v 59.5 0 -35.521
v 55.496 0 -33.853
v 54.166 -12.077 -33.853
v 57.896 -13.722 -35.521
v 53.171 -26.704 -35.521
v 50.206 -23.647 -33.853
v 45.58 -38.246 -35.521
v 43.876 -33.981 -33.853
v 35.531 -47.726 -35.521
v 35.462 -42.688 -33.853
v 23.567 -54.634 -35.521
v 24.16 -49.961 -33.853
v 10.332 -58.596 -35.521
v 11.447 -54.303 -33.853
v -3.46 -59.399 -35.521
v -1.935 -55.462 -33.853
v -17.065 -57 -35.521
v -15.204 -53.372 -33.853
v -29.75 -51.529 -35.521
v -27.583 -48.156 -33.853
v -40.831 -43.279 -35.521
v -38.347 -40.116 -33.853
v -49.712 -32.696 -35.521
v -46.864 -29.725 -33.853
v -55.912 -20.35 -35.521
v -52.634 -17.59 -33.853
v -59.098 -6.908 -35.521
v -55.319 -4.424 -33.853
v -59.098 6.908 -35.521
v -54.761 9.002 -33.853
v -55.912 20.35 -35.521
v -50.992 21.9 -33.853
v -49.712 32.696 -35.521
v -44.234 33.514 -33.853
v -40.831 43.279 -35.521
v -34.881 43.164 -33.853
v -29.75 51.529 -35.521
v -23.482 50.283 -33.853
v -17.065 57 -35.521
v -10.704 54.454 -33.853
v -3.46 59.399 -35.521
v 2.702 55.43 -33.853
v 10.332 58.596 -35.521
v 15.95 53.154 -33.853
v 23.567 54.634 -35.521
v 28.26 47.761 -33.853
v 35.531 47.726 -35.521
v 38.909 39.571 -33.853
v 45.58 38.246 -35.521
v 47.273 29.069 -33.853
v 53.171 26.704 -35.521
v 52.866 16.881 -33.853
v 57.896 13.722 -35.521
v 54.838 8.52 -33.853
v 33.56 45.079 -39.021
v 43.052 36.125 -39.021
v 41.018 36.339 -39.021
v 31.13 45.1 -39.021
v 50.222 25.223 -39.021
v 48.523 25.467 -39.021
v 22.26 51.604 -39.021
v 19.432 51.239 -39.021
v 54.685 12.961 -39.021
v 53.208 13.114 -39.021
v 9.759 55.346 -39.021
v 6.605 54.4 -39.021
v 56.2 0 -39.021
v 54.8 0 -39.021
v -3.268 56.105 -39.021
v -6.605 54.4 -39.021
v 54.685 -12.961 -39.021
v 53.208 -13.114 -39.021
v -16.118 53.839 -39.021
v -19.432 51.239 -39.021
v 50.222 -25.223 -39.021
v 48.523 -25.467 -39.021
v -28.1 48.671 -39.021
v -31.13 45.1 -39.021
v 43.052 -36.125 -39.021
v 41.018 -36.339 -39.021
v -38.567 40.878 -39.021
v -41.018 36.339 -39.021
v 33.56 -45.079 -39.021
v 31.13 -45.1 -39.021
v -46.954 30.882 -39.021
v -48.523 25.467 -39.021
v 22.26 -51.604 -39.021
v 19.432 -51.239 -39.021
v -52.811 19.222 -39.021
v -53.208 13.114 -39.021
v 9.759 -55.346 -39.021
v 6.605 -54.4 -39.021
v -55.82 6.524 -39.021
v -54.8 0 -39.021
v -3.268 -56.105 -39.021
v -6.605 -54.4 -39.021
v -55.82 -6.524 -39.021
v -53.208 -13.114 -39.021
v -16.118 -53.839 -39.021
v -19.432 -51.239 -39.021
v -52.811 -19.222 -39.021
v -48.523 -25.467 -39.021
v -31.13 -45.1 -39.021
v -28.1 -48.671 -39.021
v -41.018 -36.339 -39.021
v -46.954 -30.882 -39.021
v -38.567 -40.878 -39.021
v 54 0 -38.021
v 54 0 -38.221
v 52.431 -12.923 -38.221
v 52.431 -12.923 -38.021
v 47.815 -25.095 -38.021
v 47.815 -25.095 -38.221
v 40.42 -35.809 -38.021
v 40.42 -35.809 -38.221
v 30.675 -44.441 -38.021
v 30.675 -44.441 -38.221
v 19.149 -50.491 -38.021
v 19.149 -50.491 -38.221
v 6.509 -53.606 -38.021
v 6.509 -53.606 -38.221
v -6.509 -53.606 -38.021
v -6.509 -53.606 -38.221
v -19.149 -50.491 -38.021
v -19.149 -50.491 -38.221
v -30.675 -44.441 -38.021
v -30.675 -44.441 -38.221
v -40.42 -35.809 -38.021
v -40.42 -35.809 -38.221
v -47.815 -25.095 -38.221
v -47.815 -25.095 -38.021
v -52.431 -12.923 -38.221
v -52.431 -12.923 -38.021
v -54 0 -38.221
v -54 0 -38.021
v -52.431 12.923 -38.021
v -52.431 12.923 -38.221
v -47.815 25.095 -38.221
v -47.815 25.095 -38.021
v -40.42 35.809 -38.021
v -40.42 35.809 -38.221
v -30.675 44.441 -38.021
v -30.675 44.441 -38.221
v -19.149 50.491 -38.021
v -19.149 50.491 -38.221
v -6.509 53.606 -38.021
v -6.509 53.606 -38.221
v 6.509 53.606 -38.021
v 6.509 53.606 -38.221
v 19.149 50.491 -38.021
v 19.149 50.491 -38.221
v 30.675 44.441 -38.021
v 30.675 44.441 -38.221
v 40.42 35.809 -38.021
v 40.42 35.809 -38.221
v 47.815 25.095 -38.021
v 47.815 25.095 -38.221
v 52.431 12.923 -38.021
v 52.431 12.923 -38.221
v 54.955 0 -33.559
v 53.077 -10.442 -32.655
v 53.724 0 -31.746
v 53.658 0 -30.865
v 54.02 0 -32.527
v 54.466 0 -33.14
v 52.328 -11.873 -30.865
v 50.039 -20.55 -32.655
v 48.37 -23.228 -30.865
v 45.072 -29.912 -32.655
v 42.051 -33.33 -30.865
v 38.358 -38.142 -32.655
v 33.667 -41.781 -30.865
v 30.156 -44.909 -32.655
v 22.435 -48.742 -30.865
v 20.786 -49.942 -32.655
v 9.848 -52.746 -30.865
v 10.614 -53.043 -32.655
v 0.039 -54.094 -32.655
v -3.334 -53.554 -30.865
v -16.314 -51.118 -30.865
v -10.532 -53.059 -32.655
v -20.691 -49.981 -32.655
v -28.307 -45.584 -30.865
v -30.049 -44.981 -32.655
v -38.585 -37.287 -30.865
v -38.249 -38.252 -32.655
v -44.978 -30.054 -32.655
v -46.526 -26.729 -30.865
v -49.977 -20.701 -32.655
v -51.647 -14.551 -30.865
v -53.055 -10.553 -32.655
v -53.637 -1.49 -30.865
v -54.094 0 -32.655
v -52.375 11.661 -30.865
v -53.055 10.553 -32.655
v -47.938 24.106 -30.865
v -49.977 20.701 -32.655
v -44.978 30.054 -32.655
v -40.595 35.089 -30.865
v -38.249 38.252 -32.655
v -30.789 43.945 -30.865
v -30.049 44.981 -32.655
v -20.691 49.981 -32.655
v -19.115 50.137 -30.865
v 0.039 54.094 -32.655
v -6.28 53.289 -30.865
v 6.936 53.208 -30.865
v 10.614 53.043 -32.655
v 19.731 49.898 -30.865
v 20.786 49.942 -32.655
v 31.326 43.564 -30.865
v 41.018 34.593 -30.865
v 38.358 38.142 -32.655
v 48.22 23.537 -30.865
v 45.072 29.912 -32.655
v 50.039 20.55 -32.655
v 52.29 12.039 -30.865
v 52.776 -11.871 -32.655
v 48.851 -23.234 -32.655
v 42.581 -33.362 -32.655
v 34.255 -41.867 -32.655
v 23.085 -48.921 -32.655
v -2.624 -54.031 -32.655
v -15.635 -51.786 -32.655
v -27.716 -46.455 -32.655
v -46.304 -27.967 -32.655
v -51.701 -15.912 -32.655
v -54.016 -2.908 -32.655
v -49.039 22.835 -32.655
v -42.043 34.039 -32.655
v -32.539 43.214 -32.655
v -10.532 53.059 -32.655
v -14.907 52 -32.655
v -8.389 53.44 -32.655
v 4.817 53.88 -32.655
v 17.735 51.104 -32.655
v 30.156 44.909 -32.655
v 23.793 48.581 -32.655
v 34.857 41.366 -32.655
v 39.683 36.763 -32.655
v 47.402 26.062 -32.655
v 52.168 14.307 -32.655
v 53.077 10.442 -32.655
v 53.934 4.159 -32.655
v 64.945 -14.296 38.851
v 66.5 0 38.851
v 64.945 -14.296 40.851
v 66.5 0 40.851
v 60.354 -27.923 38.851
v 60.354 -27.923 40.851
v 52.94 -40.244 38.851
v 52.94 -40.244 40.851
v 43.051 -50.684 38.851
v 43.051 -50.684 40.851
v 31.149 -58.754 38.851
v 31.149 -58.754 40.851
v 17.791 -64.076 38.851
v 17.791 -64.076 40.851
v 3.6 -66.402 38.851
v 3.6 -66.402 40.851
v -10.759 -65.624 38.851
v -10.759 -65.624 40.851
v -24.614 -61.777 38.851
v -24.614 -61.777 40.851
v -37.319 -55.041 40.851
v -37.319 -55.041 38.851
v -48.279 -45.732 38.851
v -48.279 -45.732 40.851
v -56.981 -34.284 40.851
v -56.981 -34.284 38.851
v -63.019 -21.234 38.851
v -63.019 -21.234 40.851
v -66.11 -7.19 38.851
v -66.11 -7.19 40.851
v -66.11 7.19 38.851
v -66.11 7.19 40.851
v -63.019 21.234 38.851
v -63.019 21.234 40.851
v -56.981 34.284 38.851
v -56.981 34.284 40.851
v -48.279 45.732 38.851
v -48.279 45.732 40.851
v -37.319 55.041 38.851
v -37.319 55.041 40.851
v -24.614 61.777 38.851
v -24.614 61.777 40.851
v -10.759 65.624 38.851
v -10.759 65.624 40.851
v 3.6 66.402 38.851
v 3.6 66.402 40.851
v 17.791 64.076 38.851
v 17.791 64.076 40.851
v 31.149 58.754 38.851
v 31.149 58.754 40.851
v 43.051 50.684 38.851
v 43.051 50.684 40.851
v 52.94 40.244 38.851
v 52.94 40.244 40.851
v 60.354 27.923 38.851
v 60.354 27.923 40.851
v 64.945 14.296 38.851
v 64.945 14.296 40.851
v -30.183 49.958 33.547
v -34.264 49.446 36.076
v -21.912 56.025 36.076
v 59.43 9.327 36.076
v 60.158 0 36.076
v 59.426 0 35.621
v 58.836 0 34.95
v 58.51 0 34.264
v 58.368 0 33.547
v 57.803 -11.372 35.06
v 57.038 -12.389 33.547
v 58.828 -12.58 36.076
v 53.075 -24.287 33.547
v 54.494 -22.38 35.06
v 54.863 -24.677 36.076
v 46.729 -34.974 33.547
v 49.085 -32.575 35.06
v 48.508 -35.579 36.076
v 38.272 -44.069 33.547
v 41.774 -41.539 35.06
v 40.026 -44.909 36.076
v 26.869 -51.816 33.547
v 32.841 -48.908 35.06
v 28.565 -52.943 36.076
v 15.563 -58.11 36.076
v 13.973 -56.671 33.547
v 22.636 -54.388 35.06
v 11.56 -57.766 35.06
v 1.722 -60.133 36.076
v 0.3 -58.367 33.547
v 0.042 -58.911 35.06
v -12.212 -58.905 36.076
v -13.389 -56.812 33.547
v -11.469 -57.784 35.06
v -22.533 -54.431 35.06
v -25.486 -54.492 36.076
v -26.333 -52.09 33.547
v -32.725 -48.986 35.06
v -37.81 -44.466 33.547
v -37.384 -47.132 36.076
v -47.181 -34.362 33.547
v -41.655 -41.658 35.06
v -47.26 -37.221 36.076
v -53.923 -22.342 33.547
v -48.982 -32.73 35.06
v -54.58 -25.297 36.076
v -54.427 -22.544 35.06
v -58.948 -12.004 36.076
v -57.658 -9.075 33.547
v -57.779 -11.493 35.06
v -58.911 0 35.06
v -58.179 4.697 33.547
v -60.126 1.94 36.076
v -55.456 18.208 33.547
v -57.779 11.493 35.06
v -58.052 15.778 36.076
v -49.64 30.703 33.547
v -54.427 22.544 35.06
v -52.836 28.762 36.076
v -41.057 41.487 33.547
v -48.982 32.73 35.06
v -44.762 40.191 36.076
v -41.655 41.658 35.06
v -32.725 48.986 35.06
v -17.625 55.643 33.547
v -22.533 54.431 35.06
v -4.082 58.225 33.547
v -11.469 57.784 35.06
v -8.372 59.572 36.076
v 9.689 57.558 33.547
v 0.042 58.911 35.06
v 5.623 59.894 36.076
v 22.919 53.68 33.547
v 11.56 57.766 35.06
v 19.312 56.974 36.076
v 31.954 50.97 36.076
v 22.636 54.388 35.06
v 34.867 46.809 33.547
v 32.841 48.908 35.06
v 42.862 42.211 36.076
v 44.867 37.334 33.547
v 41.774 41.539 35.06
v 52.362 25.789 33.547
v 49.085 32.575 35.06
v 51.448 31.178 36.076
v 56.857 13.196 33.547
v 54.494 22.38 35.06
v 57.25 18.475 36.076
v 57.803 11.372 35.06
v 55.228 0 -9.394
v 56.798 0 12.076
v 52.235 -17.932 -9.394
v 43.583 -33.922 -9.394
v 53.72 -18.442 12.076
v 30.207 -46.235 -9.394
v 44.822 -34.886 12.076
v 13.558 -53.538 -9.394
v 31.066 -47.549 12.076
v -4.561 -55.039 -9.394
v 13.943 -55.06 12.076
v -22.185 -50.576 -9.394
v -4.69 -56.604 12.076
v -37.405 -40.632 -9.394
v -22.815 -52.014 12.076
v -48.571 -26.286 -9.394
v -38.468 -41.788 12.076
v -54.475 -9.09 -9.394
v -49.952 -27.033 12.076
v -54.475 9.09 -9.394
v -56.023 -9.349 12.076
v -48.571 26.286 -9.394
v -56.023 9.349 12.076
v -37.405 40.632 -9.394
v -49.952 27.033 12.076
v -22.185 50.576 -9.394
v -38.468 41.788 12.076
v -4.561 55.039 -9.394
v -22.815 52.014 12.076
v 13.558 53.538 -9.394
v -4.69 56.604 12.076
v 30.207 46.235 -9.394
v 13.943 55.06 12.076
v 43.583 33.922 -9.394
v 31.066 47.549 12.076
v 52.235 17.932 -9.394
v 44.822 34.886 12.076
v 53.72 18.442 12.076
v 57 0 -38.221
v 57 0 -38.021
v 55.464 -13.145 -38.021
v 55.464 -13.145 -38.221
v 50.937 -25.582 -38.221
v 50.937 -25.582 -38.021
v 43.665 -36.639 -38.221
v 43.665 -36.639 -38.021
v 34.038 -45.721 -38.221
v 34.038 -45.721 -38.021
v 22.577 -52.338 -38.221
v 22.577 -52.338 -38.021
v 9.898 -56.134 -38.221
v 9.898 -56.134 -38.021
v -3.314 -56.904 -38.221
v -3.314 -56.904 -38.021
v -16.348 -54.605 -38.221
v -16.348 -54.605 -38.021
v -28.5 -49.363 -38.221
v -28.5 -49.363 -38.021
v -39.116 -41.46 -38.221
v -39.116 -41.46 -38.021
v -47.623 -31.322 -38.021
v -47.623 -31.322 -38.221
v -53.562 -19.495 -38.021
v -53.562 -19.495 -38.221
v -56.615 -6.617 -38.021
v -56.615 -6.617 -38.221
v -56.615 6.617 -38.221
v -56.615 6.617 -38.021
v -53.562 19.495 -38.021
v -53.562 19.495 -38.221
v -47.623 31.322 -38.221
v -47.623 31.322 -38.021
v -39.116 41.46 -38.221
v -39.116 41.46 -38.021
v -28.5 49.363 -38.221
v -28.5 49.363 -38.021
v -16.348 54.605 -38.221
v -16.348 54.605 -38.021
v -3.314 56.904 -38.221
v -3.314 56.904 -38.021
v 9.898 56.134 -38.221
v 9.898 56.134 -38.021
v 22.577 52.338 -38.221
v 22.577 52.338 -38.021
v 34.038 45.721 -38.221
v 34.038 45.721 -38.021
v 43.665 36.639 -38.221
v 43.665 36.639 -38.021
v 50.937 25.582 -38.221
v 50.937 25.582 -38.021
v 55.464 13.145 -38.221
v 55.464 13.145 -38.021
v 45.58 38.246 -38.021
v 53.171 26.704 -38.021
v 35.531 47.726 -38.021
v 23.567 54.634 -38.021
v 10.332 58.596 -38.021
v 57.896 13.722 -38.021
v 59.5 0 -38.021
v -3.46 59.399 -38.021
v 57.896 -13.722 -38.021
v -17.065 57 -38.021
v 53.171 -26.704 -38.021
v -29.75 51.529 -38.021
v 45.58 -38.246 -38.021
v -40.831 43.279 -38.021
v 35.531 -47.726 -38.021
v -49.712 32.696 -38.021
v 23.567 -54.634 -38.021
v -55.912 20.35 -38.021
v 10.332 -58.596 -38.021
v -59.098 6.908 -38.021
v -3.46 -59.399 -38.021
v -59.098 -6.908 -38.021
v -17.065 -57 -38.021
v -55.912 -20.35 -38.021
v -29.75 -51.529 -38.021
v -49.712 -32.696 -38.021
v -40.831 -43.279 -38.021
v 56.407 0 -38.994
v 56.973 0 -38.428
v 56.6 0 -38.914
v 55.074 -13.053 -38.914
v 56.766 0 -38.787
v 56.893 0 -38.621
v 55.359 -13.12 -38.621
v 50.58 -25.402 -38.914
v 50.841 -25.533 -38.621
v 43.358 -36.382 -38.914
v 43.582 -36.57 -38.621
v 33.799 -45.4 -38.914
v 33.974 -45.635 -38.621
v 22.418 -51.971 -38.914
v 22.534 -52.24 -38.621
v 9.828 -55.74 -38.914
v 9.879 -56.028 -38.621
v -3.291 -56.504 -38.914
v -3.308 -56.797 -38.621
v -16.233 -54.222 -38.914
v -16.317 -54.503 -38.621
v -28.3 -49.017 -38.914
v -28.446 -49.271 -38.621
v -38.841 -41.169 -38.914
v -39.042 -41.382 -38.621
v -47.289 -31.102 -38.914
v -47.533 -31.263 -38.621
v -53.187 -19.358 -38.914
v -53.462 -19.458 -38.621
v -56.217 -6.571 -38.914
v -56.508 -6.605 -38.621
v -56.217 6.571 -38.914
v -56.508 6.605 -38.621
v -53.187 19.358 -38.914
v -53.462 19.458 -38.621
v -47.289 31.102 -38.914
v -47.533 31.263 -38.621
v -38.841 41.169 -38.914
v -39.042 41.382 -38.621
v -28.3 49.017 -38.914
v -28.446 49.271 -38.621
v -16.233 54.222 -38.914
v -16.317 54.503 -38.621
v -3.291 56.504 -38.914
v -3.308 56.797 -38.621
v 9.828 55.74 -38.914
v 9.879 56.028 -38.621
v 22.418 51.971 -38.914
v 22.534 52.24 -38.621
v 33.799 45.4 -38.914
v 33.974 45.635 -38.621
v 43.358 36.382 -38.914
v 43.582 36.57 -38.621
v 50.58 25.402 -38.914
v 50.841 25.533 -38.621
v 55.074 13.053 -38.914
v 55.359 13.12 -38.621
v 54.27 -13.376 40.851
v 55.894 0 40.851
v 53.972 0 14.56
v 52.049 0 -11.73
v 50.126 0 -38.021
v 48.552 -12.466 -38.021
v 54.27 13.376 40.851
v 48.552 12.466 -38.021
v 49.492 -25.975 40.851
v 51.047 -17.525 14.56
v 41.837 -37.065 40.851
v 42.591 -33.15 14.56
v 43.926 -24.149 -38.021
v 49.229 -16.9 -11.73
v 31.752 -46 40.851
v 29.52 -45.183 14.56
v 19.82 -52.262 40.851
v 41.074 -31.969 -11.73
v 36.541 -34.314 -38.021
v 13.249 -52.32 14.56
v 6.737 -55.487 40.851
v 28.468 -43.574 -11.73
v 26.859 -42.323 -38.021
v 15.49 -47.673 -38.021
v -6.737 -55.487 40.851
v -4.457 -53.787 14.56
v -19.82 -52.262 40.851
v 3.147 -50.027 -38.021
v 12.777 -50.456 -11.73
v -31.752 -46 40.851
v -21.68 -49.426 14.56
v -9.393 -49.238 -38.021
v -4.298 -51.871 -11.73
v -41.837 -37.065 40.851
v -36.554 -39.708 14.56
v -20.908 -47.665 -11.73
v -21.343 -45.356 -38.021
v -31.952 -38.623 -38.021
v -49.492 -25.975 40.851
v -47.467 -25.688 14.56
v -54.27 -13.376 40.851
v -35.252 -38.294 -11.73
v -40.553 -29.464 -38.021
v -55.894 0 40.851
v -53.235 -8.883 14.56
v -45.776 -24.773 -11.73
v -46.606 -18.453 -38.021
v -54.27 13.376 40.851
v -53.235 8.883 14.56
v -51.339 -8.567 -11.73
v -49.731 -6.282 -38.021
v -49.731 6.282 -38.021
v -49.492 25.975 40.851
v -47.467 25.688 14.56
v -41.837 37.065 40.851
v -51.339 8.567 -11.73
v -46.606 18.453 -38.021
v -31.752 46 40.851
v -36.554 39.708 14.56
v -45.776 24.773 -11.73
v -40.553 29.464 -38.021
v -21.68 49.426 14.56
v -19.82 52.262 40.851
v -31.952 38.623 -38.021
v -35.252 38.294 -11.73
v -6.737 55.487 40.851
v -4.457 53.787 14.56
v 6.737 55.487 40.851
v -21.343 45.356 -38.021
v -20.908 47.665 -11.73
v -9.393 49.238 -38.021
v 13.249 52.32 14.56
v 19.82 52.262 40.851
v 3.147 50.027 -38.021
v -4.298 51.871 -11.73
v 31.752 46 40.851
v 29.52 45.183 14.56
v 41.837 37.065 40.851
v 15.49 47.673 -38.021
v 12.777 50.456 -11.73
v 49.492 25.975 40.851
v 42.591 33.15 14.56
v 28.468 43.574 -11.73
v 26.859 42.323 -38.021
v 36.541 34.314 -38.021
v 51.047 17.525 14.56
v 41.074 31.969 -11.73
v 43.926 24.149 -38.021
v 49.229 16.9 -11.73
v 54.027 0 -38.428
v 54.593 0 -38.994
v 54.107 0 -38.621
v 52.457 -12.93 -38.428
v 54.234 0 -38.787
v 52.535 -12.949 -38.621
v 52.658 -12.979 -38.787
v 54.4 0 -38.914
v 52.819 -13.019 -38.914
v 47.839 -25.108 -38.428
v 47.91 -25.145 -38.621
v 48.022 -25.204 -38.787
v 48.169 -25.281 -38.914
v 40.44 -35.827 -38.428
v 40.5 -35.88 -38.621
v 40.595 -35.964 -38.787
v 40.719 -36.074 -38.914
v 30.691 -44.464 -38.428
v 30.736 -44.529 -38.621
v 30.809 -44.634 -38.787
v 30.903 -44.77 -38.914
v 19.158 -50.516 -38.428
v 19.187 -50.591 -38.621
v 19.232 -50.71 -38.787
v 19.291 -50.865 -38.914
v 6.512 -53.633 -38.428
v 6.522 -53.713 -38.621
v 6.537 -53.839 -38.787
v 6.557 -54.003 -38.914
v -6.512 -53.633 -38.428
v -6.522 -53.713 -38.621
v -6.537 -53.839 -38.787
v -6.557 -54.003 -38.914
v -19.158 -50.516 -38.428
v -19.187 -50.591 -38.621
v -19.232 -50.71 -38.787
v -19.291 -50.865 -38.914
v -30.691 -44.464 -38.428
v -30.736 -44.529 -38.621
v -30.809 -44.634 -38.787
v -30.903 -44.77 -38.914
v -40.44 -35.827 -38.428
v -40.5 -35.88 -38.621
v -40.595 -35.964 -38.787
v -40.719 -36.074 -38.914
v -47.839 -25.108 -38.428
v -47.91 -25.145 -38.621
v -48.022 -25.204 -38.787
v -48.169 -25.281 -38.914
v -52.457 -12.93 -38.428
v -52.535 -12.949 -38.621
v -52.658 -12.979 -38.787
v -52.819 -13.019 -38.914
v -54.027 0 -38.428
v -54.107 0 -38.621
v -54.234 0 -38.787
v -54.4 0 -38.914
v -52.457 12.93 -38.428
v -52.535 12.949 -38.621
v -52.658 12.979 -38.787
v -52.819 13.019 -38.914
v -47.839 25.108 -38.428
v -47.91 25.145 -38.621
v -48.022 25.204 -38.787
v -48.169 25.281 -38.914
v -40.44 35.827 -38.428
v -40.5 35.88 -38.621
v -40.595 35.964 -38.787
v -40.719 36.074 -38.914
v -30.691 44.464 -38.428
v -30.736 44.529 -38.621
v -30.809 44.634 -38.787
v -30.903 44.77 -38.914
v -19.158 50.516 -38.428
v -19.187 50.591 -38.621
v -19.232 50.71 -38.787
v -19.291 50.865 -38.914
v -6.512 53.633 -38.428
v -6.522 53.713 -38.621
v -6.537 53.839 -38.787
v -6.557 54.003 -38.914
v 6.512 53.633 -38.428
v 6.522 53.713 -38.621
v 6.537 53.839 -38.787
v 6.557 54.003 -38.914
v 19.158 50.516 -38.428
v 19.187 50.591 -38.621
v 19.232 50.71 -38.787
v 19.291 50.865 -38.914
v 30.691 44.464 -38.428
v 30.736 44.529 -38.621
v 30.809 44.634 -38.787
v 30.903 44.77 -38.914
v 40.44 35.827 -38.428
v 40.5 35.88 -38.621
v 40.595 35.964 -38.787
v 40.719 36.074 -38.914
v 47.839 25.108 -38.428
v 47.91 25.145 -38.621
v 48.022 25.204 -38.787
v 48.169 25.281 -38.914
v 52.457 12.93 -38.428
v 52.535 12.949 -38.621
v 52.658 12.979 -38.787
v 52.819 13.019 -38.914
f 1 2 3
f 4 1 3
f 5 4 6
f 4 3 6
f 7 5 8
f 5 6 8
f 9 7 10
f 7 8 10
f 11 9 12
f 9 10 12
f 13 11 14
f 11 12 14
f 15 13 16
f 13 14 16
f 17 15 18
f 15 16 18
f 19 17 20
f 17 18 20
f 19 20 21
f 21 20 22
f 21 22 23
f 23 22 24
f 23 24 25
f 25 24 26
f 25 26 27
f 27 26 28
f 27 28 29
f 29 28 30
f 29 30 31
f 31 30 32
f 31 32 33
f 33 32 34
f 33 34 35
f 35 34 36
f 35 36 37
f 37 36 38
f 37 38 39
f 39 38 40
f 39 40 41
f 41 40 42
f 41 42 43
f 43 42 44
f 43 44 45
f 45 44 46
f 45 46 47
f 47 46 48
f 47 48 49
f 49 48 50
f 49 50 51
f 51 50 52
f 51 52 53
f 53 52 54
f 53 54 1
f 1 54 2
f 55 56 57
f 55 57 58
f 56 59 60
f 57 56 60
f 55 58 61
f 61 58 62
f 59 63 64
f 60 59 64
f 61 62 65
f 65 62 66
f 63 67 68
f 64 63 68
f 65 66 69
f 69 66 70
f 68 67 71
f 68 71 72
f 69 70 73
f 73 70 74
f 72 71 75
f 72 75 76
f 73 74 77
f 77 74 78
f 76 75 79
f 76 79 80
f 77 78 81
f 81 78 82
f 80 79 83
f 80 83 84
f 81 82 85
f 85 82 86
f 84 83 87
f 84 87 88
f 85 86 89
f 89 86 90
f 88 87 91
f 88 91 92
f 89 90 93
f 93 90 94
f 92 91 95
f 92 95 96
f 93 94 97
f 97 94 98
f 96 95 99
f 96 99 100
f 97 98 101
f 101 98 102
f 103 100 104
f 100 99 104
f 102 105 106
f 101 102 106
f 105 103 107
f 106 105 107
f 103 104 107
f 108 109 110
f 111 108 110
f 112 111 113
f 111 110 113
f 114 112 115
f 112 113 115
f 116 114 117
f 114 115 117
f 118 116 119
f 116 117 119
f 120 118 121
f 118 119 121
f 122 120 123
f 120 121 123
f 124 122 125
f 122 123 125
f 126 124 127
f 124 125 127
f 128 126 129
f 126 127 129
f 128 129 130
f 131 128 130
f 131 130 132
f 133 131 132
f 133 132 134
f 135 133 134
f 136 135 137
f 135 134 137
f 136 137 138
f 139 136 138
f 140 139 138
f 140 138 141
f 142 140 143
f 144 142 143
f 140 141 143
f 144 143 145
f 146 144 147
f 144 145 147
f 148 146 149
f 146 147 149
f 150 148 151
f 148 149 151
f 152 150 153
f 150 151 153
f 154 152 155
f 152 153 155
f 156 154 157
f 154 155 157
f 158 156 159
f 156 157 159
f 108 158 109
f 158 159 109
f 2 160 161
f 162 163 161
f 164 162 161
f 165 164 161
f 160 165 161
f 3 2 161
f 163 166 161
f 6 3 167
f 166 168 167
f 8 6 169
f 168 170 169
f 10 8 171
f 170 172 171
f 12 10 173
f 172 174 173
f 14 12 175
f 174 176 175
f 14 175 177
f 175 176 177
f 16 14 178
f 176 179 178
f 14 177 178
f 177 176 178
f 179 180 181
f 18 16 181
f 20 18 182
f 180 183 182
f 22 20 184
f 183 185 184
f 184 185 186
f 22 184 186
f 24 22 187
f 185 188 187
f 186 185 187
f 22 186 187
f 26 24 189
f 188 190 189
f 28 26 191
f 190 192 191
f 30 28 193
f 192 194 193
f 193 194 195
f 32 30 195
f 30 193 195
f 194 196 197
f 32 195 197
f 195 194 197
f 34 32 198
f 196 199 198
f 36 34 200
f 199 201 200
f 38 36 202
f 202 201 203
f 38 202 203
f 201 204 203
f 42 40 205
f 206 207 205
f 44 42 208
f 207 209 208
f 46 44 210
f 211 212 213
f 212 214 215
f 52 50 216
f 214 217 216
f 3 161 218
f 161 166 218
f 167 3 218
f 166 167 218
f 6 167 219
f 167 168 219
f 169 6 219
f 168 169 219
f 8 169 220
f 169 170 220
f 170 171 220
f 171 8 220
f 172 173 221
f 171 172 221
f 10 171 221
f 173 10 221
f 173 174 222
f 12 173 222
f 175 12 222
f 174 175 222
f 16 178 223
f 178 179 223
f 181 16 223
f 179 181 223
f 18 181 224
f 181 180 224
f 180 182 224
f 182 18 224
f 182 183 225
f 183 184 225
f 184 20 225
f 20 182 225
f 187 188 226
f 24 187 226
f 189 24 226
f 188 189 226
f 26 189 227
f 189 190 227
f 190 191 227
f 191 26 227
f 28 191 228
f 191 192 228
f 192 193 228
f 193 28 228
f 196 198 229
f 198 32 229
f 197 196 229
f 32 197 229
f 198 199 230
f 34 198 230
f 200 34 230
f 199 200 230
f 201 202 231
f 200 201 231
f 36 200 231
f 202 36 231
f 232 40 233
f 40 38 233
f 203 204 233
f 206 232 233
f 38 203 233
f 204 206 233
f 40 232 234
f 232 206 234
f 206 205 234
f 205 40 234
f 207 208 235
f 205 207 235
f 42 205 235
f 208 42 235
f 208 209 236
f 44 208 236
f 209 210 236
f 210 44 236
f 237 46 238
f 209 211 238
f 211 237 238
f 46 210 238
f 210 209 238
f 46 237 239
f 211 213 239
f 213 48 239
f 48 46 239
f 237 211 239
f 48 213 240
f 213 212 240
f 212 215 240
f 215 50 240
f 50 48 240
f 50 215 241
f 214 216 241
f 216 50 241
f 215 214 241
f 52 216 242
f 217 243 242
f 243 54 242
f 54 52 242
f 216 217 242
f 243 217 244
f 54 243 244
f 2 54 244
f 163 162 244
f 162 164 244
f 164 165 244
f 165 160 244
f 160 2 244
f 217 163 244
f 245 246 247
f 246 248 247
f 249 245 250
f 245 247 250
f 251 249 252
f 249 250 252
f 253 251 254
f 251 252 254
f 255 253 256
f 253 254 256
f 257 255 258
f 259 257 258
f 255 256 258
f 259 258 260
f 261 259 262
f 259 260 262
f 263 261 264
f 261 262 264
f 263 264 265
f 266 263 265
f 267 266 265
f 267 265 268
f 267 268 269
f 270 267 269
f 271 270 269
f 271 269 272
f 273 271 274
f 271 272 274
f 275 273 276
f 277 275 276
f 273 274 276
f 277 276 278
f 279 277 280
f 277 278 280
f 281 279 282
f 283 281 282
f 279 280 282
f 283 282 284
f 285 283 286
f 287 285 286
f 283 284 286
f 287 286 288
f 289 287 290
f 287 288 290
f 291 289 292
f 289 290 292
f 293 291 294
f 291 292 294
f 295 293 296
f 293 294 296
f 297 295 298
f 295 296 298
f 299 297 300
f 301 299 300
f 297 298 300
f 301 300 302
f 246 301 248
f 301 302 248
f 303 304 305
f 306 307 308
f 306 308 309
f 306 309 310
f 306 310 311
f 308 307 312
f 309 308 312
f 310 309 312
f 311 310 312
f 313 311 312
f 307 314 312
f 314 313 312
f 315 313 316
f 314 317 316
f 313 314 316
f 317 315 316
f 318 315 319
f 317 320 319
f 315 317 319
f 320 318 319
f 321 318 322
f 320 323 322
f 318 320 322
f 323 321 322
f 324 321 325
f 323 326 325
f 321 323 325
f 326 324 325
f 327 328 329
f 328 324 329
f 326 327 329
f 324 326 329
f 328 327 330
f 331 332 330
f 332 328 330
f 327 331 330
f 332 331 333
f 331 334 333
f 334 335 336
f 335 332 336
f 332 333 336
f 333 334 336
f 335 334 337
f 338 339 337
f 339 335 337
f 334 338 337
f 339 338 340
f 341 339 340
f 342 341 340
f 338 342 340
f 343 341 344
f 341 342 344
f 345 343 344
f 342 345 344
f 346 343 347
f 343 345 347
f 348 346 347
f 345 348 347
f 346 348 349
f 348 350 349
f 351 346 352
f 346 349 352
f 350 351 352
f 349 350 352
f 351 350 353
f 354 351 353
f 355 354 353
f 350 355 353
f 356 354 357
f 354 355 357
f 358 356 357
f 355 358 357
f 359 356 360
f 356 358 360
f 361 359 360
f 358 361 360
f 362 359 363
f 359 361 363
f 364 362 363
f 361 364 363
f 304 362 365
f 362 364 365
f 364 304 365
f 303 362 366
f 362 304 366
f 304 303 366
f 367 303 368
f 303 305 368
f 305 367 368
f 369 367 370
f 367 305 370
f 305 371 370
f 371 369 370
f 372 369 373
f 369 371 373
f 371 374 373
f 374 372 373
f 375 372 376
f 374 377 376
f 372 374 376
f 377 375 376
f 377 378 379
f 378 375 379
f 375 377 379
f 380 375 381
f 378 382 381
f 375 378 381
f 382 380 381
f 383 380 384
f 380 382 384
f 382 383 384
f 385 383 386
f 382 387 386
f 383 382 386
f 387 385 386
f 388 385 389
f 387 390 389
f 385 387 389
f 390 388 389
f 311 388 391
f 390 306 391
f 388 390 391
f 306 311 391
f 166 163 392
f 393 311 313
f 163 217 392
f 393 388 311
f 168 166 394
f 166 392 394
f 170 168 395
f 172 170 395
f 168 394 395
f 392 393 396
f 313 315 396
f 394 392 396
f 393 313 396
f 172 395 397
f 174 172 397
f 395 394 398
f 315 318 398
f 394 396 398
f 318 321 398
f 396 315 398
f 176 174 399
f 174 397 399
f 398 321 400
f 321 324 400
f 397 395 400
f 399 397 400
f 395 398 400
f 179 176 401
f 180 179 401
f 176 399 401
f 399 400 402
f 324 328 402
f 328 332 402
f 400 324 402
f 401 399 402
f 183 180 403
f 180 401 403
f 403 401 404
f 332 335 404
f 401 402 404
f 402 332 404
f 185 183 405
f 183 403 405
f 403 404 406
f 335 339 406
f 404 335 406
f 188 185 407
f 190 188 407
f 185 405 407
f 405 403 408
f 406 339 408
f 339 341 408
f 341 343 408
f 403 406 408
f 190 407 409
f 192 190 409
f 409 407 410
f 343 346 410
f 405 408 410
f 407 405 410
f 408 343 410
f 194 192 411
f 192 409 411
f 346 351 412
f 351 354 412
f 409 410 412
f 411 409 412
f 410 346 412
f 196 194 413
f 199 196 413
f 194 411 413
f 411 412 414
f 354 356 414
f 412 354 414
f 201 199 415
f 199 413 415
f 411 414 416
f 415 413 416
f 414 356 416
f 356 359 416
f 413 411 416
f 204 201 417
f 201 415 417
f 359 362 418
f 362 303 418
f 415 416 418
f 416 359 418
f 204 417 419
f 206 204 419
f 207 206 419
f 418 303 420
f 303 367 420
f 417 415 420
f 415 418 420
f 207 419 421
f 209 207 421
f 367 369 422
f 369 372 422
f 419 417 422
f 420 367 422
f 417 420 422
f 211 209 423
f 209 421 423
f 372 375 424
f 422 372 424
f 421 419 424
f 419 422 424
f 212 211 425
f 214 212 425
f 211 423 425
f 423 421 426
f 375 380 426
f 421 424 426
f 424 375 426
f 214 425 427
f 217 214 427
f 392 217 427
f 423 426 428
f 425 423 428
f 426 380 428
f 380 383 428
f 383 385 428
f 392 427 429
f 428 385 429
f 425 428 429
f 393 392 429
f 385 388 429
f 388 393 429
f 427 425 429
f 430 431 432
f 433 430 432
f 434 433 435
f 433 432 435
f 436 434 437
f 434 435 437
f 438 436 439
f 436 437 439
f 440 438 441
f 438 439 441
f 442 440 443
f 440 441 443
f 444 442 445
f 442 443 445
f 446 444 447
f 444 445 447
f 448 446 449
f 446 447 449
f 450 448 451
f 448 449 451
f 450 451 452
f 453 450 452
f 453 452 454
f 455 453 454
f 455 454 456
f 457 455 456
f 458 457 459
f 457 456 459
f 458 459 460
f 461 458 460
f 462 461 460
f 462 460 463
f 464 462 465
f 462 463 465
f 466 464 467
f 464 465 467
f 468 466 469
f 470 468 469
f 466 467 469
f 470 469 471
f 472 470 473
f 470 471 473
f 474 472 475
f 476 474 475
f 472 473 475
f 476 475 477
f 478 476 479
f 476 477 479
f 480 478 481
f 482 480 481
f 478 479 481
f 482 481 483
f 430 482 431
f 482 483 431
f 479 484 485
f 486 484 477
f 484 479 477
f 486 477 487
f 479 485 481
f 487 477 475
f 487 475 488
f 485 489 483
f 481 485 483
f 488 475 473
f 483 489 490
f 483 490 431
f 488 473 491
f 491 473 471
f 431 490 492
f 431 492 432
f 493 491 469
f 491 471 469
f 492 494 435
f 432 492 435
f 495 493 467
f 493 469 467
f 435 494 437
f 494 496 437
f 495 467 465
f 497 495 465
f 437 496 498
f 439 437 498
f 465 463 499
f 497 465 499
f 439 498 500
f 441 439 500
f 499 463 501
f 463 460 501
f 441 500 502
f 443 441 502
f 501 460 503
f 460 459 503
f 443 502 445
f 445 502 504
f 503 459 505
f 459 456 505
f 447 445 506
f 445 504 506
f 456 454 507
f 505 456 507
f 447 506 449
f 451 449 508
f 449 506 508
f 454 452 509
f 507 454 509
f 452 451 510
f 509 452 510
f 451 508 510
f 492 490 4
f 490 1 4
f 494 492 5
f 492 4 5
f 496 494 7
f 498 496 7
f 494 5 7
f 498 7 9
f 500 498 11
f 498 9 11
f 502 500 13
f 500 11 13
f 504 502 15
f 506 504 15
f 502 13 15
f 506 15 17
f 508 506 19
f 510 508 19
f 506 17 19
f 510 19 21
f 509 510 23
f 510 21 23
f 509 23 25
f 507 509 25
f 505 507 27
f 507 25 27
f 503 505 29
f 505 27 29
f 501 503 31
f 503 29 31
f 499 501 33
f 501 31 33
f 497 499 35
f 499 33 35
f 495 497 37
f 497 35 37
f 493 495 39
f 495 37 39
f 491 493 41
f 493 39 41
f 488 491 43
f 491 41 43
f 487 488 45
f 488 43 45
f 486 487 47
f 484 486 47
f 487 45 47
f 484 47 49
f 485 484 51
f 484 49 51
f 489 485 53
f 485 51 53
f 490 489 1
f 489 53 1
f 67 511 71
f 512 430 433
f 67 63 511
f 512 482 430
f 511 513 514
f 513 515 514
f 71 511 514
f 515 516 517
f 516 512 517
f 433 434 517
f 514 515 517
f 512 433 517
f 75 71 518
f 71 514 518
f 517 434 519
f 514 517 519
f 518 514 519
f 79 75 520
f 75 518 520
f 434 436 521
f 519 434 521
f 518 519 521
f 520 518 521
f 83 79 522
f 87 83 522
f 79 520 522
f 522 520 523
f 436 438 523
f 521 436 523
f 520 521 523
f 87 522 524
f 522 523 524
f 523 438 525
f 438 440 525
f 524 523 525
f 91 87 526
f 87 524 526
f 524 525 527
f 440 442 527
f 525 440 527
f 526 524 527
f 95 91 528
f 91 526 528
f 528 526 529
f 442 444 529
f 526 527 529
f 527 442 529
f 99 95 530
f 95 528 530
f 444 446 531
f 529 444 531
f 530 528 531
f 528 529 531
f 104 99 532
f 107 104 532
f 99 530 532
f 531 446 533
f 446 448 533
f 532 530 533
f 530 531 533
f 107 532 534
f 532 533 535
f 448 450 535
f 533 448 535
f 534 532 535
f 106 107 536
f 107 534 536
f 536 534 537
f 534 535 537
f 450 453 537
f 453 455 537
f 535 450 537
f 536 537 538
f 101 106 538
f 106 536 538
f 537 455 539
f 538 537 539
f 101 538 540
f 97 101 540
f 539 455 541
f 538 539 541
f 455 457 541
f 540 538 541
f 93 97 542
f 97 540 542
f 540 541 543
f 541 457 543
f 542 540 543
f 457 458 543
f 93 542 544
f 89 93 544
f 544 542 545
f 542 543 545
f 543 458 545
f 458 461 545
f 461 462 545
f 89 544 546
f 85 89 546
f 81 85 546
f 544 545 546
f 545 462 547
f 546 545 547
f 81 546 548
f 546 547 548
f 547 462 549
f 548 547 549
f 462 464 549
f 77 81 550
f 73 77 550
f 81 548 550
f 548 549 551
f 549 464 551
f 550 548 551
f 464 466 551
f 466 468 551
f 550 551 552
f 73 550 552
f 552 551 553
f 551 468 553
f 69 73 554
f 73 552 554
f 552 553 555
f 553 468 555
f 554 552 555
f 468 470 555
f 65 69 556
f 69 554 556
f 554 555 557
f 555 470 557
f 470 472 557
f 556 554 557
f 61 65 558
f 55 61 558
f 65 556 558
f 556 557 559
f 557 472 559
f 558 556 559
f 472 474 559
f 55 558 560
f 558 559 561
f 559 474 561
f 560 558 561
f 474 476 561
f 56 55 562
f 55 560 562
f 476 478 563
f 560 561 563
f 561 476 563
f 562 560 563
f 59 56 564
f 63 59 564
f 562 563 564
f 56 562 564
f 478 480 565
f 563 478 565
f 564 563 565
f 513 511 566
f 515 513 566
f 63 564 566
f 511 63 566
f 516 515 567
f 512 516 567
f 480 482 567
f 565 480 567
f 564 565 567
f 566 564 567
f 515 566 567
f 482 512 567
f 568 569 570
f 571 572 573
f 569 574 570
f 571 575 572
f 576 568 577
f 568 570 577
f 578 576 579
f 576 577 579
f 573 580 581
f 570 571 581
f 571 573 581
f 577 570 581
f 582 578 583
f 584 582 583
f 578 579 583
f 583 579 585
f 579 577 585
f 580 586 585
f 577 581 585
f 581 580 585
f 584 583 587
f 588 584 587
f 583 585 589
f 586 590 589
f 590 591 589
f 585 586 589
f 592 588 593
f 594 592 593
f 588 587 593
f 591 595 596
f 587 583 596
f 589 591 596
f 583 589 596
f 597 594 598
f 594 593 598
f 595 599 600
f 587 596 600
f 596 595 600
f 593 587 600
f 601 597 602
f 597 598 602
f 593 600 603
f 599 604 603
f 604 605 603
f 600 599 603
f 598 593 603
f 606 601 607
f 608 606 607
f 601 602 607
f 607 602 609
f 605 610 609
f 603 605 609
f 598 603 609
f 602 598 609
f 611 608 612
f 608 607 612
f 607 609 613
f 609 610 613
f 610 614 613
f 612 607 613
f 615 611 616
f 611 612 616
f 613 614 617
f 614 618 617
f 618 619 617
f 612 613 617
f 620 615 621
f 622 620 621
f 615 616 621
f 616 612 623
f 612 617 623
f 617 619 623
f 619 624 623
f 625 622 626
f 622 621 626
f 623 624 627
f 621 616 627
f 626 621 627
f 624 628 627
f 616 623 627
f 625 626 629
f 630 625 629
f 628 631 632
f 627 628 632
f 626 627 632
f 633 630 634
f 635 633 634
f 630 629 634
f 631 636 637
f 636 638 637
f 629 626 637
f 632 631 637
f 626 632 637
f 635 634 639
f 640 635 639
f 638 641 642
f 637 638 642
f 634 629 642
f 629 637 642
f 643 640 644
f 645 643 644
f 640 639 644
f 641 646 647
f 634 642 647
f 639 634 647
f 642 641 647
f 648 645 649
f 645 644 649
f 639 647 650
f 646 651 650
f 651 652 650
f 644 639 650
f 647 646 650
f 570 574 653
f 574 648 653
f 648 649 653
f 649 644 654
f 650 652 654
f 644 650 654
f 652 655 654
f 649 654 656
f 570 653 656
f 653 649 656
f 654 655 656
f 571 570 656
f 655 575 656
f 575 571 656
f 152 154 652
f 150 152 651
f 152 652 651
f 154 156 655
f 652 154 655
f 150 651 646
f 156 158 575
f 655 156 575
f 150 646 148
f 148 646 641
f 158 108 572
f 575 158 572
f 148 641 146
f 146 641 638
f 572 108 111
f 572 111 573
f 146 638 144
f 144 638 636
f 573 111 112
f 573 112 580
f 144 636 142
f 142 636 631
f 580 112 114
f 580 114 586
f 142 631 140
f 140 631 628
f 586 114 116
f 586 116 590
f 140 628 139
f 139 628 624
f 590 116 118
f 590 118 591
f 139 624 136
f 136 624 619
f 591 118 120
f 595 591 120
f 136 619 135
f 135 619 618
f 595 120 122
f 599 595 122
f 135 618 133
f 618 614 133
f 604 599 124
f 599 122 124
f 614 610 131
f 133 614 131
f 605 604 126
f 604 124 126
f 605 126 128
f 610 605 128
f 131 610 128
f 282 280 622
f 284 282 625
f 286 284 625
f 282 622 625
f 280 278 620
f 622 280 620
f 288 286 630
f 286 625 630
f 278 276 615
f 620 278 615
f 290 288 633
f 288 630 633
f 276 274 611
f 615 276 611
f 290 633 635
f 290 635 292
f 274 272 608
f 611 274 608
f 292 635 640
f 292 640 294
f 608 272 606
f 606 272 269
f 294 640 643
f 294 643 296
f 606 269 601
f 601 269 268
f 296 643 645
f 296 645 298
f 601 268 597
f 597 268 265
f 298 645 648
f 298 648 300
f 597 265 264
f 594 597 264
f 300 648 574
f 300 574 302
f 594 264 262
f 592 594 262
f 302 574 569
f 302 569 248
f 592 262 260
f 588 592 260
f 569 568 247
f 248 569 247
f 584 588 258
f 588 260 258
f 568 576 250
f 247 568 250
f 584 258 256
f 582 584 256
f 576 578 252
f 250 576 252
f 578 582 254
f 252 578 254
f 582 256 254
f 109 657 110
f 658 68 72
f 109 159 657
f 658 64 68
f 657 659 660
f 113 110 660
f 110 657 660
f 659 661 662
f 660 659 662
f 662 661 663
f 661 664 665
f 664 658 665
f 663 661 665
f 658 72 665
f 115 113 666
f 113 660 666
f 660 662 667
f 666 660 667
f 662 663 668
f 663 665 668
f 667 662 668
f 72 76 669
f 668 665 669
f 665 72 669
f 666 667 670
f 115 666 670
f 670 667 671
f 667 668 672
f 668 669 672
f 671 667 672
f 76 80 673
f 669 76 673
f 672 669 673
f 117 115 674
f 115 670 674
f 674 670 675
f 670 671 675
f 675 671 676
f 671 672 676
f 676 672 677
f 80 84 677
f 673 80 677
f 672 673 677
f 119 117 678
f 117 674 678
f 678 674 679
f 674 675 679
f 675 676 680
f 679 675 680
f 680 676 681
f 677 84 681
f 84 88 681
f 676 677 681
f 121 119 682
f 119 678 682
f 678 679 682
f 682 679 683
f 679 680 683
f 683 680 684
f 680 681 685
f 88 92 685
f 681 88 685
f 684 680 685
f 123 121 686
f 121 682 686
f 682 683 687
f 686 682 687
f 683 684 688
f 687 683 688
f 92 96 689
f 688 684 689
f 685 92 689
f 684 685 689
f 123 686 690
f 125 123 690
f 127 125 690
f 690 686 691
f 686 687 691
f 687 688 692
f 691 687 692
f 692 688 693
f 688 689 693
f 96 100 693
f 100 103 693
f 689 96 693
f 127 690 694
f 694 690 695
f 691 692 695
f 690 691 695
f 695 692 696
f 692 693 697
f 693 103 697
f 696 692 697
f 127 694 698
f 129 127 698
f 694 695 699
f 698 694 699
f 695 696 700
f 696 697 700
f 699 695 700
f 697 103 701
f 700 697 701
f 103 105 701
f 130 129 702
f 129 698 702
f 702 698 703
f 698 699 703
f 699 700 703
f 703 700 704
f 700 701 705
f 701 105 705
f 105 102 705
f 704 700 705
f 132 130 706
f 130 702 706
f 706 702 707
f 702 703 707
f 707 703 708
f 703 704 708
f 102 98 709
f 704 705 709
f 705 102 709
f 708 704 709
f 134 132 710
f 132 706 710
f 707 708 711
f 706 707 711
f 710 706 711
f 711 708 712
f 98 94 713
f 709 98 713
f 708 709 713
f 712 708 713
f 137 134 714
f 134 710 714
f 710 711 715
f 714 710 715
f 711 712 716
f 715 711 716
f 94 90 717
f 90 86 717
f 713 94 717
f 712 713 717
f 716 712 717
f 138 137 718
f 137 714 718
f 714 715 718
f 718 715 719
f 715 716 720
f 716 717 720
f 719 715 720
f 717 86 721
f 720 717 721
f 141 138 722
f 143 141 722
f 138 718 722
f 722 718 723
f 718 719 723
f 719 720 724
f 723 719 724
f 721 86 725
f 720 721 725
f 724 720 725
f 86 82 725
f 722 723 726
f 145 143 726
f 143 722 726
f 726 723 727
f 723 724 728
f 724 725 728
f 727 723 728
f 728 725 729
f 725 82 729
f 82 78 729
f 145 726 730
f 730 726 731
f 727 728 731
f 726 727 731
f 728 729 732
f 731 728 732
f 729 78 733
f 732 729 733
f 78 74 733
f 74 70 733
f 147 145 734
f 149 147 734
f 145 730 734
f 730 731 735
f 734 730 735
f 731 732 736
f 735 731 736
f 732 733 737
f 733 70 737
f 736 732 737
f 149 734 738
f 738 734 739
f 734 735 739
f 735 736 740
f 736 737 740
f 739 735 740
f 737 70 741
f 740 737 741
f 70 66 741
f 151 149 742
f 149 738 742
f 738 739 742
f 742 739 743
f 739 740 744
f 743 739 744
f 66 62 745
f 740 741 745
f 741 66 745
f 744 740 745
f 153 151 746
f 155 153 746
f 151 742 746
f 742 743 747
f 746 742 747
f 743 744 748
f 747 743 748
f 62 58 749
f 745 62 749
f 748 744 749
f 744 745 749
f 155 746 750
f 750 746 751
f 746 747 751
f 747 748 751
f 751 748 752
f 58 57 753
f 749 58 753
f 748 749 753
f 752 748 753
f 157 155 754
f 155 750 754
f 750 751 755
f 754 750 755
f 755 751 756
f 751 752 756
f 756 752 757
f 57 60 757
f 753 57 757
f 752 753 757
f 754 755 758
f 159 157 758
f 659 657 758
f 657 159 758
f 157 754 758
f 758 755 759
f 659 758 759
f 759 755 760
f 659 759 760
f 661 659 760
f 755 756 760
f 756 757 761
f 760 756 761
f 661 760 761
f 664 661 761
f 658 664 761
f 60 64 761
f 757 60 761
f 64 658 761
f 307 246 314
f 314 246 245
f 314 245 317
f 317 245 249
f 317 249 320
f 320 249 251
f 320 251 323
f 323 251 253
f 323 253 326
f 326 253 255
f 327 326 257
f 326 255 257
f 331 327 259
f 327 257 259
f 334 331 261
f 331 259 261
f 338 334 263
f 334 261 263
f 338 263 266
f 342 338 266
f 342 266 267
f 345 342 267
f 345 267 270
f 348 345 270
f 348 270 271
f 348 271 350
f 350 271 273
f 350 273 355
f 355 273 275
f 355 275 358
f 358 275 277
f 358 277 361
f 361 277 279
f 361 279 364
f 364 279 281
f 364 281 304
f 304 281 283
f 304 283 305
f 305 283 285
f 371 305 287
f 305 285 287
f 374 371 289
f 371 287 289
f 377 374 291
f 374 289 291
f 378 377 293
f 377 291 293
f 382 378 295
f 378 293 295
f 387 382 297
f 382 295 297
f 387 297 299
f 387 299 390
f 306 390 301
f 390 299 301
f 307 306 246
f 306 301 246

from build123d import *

# Parameters (mm, degrees)
F2_R = 0.8
F3_R = 3


with BuildPart() as f1:
    # F0 (on Front) → F1 (revolve)
    with BuildSketch(Plane.XZ):
        Polygon((66.5, 40.850982), (55.8942, 40.850982), (50.126342, -38.021039), (54, -38.021039), (54, -39.021039), (57, -39.021039), (57, -38.021039), (59.5, -38.021039), (59.5, -35.521039), (53.5, -33.021039), (58.5, 35.350982), (66.5, 38.850982), align=None)
    revolve(axis=Axis((0, 0, -10.226812), (0, 0, -1)))

    # F2
    f2_edges = [f1.edges().sort_by_distance(p)[0] for p in [
        (-54, 0, -39.021039),
        (-57, 0, -39.021039),
    ]]
    fillet(f2_edges, radius=F2_R)

    # F3
    f3_edges = [f1.edges().sort_by_distance(p)[0] for p in [
        (-58.5, 0, 35.350982),
        (-53.5, 0, -33.021039),
    ]]
    fillet(f3_edges, radius=F3_R)


solid = f1.part
